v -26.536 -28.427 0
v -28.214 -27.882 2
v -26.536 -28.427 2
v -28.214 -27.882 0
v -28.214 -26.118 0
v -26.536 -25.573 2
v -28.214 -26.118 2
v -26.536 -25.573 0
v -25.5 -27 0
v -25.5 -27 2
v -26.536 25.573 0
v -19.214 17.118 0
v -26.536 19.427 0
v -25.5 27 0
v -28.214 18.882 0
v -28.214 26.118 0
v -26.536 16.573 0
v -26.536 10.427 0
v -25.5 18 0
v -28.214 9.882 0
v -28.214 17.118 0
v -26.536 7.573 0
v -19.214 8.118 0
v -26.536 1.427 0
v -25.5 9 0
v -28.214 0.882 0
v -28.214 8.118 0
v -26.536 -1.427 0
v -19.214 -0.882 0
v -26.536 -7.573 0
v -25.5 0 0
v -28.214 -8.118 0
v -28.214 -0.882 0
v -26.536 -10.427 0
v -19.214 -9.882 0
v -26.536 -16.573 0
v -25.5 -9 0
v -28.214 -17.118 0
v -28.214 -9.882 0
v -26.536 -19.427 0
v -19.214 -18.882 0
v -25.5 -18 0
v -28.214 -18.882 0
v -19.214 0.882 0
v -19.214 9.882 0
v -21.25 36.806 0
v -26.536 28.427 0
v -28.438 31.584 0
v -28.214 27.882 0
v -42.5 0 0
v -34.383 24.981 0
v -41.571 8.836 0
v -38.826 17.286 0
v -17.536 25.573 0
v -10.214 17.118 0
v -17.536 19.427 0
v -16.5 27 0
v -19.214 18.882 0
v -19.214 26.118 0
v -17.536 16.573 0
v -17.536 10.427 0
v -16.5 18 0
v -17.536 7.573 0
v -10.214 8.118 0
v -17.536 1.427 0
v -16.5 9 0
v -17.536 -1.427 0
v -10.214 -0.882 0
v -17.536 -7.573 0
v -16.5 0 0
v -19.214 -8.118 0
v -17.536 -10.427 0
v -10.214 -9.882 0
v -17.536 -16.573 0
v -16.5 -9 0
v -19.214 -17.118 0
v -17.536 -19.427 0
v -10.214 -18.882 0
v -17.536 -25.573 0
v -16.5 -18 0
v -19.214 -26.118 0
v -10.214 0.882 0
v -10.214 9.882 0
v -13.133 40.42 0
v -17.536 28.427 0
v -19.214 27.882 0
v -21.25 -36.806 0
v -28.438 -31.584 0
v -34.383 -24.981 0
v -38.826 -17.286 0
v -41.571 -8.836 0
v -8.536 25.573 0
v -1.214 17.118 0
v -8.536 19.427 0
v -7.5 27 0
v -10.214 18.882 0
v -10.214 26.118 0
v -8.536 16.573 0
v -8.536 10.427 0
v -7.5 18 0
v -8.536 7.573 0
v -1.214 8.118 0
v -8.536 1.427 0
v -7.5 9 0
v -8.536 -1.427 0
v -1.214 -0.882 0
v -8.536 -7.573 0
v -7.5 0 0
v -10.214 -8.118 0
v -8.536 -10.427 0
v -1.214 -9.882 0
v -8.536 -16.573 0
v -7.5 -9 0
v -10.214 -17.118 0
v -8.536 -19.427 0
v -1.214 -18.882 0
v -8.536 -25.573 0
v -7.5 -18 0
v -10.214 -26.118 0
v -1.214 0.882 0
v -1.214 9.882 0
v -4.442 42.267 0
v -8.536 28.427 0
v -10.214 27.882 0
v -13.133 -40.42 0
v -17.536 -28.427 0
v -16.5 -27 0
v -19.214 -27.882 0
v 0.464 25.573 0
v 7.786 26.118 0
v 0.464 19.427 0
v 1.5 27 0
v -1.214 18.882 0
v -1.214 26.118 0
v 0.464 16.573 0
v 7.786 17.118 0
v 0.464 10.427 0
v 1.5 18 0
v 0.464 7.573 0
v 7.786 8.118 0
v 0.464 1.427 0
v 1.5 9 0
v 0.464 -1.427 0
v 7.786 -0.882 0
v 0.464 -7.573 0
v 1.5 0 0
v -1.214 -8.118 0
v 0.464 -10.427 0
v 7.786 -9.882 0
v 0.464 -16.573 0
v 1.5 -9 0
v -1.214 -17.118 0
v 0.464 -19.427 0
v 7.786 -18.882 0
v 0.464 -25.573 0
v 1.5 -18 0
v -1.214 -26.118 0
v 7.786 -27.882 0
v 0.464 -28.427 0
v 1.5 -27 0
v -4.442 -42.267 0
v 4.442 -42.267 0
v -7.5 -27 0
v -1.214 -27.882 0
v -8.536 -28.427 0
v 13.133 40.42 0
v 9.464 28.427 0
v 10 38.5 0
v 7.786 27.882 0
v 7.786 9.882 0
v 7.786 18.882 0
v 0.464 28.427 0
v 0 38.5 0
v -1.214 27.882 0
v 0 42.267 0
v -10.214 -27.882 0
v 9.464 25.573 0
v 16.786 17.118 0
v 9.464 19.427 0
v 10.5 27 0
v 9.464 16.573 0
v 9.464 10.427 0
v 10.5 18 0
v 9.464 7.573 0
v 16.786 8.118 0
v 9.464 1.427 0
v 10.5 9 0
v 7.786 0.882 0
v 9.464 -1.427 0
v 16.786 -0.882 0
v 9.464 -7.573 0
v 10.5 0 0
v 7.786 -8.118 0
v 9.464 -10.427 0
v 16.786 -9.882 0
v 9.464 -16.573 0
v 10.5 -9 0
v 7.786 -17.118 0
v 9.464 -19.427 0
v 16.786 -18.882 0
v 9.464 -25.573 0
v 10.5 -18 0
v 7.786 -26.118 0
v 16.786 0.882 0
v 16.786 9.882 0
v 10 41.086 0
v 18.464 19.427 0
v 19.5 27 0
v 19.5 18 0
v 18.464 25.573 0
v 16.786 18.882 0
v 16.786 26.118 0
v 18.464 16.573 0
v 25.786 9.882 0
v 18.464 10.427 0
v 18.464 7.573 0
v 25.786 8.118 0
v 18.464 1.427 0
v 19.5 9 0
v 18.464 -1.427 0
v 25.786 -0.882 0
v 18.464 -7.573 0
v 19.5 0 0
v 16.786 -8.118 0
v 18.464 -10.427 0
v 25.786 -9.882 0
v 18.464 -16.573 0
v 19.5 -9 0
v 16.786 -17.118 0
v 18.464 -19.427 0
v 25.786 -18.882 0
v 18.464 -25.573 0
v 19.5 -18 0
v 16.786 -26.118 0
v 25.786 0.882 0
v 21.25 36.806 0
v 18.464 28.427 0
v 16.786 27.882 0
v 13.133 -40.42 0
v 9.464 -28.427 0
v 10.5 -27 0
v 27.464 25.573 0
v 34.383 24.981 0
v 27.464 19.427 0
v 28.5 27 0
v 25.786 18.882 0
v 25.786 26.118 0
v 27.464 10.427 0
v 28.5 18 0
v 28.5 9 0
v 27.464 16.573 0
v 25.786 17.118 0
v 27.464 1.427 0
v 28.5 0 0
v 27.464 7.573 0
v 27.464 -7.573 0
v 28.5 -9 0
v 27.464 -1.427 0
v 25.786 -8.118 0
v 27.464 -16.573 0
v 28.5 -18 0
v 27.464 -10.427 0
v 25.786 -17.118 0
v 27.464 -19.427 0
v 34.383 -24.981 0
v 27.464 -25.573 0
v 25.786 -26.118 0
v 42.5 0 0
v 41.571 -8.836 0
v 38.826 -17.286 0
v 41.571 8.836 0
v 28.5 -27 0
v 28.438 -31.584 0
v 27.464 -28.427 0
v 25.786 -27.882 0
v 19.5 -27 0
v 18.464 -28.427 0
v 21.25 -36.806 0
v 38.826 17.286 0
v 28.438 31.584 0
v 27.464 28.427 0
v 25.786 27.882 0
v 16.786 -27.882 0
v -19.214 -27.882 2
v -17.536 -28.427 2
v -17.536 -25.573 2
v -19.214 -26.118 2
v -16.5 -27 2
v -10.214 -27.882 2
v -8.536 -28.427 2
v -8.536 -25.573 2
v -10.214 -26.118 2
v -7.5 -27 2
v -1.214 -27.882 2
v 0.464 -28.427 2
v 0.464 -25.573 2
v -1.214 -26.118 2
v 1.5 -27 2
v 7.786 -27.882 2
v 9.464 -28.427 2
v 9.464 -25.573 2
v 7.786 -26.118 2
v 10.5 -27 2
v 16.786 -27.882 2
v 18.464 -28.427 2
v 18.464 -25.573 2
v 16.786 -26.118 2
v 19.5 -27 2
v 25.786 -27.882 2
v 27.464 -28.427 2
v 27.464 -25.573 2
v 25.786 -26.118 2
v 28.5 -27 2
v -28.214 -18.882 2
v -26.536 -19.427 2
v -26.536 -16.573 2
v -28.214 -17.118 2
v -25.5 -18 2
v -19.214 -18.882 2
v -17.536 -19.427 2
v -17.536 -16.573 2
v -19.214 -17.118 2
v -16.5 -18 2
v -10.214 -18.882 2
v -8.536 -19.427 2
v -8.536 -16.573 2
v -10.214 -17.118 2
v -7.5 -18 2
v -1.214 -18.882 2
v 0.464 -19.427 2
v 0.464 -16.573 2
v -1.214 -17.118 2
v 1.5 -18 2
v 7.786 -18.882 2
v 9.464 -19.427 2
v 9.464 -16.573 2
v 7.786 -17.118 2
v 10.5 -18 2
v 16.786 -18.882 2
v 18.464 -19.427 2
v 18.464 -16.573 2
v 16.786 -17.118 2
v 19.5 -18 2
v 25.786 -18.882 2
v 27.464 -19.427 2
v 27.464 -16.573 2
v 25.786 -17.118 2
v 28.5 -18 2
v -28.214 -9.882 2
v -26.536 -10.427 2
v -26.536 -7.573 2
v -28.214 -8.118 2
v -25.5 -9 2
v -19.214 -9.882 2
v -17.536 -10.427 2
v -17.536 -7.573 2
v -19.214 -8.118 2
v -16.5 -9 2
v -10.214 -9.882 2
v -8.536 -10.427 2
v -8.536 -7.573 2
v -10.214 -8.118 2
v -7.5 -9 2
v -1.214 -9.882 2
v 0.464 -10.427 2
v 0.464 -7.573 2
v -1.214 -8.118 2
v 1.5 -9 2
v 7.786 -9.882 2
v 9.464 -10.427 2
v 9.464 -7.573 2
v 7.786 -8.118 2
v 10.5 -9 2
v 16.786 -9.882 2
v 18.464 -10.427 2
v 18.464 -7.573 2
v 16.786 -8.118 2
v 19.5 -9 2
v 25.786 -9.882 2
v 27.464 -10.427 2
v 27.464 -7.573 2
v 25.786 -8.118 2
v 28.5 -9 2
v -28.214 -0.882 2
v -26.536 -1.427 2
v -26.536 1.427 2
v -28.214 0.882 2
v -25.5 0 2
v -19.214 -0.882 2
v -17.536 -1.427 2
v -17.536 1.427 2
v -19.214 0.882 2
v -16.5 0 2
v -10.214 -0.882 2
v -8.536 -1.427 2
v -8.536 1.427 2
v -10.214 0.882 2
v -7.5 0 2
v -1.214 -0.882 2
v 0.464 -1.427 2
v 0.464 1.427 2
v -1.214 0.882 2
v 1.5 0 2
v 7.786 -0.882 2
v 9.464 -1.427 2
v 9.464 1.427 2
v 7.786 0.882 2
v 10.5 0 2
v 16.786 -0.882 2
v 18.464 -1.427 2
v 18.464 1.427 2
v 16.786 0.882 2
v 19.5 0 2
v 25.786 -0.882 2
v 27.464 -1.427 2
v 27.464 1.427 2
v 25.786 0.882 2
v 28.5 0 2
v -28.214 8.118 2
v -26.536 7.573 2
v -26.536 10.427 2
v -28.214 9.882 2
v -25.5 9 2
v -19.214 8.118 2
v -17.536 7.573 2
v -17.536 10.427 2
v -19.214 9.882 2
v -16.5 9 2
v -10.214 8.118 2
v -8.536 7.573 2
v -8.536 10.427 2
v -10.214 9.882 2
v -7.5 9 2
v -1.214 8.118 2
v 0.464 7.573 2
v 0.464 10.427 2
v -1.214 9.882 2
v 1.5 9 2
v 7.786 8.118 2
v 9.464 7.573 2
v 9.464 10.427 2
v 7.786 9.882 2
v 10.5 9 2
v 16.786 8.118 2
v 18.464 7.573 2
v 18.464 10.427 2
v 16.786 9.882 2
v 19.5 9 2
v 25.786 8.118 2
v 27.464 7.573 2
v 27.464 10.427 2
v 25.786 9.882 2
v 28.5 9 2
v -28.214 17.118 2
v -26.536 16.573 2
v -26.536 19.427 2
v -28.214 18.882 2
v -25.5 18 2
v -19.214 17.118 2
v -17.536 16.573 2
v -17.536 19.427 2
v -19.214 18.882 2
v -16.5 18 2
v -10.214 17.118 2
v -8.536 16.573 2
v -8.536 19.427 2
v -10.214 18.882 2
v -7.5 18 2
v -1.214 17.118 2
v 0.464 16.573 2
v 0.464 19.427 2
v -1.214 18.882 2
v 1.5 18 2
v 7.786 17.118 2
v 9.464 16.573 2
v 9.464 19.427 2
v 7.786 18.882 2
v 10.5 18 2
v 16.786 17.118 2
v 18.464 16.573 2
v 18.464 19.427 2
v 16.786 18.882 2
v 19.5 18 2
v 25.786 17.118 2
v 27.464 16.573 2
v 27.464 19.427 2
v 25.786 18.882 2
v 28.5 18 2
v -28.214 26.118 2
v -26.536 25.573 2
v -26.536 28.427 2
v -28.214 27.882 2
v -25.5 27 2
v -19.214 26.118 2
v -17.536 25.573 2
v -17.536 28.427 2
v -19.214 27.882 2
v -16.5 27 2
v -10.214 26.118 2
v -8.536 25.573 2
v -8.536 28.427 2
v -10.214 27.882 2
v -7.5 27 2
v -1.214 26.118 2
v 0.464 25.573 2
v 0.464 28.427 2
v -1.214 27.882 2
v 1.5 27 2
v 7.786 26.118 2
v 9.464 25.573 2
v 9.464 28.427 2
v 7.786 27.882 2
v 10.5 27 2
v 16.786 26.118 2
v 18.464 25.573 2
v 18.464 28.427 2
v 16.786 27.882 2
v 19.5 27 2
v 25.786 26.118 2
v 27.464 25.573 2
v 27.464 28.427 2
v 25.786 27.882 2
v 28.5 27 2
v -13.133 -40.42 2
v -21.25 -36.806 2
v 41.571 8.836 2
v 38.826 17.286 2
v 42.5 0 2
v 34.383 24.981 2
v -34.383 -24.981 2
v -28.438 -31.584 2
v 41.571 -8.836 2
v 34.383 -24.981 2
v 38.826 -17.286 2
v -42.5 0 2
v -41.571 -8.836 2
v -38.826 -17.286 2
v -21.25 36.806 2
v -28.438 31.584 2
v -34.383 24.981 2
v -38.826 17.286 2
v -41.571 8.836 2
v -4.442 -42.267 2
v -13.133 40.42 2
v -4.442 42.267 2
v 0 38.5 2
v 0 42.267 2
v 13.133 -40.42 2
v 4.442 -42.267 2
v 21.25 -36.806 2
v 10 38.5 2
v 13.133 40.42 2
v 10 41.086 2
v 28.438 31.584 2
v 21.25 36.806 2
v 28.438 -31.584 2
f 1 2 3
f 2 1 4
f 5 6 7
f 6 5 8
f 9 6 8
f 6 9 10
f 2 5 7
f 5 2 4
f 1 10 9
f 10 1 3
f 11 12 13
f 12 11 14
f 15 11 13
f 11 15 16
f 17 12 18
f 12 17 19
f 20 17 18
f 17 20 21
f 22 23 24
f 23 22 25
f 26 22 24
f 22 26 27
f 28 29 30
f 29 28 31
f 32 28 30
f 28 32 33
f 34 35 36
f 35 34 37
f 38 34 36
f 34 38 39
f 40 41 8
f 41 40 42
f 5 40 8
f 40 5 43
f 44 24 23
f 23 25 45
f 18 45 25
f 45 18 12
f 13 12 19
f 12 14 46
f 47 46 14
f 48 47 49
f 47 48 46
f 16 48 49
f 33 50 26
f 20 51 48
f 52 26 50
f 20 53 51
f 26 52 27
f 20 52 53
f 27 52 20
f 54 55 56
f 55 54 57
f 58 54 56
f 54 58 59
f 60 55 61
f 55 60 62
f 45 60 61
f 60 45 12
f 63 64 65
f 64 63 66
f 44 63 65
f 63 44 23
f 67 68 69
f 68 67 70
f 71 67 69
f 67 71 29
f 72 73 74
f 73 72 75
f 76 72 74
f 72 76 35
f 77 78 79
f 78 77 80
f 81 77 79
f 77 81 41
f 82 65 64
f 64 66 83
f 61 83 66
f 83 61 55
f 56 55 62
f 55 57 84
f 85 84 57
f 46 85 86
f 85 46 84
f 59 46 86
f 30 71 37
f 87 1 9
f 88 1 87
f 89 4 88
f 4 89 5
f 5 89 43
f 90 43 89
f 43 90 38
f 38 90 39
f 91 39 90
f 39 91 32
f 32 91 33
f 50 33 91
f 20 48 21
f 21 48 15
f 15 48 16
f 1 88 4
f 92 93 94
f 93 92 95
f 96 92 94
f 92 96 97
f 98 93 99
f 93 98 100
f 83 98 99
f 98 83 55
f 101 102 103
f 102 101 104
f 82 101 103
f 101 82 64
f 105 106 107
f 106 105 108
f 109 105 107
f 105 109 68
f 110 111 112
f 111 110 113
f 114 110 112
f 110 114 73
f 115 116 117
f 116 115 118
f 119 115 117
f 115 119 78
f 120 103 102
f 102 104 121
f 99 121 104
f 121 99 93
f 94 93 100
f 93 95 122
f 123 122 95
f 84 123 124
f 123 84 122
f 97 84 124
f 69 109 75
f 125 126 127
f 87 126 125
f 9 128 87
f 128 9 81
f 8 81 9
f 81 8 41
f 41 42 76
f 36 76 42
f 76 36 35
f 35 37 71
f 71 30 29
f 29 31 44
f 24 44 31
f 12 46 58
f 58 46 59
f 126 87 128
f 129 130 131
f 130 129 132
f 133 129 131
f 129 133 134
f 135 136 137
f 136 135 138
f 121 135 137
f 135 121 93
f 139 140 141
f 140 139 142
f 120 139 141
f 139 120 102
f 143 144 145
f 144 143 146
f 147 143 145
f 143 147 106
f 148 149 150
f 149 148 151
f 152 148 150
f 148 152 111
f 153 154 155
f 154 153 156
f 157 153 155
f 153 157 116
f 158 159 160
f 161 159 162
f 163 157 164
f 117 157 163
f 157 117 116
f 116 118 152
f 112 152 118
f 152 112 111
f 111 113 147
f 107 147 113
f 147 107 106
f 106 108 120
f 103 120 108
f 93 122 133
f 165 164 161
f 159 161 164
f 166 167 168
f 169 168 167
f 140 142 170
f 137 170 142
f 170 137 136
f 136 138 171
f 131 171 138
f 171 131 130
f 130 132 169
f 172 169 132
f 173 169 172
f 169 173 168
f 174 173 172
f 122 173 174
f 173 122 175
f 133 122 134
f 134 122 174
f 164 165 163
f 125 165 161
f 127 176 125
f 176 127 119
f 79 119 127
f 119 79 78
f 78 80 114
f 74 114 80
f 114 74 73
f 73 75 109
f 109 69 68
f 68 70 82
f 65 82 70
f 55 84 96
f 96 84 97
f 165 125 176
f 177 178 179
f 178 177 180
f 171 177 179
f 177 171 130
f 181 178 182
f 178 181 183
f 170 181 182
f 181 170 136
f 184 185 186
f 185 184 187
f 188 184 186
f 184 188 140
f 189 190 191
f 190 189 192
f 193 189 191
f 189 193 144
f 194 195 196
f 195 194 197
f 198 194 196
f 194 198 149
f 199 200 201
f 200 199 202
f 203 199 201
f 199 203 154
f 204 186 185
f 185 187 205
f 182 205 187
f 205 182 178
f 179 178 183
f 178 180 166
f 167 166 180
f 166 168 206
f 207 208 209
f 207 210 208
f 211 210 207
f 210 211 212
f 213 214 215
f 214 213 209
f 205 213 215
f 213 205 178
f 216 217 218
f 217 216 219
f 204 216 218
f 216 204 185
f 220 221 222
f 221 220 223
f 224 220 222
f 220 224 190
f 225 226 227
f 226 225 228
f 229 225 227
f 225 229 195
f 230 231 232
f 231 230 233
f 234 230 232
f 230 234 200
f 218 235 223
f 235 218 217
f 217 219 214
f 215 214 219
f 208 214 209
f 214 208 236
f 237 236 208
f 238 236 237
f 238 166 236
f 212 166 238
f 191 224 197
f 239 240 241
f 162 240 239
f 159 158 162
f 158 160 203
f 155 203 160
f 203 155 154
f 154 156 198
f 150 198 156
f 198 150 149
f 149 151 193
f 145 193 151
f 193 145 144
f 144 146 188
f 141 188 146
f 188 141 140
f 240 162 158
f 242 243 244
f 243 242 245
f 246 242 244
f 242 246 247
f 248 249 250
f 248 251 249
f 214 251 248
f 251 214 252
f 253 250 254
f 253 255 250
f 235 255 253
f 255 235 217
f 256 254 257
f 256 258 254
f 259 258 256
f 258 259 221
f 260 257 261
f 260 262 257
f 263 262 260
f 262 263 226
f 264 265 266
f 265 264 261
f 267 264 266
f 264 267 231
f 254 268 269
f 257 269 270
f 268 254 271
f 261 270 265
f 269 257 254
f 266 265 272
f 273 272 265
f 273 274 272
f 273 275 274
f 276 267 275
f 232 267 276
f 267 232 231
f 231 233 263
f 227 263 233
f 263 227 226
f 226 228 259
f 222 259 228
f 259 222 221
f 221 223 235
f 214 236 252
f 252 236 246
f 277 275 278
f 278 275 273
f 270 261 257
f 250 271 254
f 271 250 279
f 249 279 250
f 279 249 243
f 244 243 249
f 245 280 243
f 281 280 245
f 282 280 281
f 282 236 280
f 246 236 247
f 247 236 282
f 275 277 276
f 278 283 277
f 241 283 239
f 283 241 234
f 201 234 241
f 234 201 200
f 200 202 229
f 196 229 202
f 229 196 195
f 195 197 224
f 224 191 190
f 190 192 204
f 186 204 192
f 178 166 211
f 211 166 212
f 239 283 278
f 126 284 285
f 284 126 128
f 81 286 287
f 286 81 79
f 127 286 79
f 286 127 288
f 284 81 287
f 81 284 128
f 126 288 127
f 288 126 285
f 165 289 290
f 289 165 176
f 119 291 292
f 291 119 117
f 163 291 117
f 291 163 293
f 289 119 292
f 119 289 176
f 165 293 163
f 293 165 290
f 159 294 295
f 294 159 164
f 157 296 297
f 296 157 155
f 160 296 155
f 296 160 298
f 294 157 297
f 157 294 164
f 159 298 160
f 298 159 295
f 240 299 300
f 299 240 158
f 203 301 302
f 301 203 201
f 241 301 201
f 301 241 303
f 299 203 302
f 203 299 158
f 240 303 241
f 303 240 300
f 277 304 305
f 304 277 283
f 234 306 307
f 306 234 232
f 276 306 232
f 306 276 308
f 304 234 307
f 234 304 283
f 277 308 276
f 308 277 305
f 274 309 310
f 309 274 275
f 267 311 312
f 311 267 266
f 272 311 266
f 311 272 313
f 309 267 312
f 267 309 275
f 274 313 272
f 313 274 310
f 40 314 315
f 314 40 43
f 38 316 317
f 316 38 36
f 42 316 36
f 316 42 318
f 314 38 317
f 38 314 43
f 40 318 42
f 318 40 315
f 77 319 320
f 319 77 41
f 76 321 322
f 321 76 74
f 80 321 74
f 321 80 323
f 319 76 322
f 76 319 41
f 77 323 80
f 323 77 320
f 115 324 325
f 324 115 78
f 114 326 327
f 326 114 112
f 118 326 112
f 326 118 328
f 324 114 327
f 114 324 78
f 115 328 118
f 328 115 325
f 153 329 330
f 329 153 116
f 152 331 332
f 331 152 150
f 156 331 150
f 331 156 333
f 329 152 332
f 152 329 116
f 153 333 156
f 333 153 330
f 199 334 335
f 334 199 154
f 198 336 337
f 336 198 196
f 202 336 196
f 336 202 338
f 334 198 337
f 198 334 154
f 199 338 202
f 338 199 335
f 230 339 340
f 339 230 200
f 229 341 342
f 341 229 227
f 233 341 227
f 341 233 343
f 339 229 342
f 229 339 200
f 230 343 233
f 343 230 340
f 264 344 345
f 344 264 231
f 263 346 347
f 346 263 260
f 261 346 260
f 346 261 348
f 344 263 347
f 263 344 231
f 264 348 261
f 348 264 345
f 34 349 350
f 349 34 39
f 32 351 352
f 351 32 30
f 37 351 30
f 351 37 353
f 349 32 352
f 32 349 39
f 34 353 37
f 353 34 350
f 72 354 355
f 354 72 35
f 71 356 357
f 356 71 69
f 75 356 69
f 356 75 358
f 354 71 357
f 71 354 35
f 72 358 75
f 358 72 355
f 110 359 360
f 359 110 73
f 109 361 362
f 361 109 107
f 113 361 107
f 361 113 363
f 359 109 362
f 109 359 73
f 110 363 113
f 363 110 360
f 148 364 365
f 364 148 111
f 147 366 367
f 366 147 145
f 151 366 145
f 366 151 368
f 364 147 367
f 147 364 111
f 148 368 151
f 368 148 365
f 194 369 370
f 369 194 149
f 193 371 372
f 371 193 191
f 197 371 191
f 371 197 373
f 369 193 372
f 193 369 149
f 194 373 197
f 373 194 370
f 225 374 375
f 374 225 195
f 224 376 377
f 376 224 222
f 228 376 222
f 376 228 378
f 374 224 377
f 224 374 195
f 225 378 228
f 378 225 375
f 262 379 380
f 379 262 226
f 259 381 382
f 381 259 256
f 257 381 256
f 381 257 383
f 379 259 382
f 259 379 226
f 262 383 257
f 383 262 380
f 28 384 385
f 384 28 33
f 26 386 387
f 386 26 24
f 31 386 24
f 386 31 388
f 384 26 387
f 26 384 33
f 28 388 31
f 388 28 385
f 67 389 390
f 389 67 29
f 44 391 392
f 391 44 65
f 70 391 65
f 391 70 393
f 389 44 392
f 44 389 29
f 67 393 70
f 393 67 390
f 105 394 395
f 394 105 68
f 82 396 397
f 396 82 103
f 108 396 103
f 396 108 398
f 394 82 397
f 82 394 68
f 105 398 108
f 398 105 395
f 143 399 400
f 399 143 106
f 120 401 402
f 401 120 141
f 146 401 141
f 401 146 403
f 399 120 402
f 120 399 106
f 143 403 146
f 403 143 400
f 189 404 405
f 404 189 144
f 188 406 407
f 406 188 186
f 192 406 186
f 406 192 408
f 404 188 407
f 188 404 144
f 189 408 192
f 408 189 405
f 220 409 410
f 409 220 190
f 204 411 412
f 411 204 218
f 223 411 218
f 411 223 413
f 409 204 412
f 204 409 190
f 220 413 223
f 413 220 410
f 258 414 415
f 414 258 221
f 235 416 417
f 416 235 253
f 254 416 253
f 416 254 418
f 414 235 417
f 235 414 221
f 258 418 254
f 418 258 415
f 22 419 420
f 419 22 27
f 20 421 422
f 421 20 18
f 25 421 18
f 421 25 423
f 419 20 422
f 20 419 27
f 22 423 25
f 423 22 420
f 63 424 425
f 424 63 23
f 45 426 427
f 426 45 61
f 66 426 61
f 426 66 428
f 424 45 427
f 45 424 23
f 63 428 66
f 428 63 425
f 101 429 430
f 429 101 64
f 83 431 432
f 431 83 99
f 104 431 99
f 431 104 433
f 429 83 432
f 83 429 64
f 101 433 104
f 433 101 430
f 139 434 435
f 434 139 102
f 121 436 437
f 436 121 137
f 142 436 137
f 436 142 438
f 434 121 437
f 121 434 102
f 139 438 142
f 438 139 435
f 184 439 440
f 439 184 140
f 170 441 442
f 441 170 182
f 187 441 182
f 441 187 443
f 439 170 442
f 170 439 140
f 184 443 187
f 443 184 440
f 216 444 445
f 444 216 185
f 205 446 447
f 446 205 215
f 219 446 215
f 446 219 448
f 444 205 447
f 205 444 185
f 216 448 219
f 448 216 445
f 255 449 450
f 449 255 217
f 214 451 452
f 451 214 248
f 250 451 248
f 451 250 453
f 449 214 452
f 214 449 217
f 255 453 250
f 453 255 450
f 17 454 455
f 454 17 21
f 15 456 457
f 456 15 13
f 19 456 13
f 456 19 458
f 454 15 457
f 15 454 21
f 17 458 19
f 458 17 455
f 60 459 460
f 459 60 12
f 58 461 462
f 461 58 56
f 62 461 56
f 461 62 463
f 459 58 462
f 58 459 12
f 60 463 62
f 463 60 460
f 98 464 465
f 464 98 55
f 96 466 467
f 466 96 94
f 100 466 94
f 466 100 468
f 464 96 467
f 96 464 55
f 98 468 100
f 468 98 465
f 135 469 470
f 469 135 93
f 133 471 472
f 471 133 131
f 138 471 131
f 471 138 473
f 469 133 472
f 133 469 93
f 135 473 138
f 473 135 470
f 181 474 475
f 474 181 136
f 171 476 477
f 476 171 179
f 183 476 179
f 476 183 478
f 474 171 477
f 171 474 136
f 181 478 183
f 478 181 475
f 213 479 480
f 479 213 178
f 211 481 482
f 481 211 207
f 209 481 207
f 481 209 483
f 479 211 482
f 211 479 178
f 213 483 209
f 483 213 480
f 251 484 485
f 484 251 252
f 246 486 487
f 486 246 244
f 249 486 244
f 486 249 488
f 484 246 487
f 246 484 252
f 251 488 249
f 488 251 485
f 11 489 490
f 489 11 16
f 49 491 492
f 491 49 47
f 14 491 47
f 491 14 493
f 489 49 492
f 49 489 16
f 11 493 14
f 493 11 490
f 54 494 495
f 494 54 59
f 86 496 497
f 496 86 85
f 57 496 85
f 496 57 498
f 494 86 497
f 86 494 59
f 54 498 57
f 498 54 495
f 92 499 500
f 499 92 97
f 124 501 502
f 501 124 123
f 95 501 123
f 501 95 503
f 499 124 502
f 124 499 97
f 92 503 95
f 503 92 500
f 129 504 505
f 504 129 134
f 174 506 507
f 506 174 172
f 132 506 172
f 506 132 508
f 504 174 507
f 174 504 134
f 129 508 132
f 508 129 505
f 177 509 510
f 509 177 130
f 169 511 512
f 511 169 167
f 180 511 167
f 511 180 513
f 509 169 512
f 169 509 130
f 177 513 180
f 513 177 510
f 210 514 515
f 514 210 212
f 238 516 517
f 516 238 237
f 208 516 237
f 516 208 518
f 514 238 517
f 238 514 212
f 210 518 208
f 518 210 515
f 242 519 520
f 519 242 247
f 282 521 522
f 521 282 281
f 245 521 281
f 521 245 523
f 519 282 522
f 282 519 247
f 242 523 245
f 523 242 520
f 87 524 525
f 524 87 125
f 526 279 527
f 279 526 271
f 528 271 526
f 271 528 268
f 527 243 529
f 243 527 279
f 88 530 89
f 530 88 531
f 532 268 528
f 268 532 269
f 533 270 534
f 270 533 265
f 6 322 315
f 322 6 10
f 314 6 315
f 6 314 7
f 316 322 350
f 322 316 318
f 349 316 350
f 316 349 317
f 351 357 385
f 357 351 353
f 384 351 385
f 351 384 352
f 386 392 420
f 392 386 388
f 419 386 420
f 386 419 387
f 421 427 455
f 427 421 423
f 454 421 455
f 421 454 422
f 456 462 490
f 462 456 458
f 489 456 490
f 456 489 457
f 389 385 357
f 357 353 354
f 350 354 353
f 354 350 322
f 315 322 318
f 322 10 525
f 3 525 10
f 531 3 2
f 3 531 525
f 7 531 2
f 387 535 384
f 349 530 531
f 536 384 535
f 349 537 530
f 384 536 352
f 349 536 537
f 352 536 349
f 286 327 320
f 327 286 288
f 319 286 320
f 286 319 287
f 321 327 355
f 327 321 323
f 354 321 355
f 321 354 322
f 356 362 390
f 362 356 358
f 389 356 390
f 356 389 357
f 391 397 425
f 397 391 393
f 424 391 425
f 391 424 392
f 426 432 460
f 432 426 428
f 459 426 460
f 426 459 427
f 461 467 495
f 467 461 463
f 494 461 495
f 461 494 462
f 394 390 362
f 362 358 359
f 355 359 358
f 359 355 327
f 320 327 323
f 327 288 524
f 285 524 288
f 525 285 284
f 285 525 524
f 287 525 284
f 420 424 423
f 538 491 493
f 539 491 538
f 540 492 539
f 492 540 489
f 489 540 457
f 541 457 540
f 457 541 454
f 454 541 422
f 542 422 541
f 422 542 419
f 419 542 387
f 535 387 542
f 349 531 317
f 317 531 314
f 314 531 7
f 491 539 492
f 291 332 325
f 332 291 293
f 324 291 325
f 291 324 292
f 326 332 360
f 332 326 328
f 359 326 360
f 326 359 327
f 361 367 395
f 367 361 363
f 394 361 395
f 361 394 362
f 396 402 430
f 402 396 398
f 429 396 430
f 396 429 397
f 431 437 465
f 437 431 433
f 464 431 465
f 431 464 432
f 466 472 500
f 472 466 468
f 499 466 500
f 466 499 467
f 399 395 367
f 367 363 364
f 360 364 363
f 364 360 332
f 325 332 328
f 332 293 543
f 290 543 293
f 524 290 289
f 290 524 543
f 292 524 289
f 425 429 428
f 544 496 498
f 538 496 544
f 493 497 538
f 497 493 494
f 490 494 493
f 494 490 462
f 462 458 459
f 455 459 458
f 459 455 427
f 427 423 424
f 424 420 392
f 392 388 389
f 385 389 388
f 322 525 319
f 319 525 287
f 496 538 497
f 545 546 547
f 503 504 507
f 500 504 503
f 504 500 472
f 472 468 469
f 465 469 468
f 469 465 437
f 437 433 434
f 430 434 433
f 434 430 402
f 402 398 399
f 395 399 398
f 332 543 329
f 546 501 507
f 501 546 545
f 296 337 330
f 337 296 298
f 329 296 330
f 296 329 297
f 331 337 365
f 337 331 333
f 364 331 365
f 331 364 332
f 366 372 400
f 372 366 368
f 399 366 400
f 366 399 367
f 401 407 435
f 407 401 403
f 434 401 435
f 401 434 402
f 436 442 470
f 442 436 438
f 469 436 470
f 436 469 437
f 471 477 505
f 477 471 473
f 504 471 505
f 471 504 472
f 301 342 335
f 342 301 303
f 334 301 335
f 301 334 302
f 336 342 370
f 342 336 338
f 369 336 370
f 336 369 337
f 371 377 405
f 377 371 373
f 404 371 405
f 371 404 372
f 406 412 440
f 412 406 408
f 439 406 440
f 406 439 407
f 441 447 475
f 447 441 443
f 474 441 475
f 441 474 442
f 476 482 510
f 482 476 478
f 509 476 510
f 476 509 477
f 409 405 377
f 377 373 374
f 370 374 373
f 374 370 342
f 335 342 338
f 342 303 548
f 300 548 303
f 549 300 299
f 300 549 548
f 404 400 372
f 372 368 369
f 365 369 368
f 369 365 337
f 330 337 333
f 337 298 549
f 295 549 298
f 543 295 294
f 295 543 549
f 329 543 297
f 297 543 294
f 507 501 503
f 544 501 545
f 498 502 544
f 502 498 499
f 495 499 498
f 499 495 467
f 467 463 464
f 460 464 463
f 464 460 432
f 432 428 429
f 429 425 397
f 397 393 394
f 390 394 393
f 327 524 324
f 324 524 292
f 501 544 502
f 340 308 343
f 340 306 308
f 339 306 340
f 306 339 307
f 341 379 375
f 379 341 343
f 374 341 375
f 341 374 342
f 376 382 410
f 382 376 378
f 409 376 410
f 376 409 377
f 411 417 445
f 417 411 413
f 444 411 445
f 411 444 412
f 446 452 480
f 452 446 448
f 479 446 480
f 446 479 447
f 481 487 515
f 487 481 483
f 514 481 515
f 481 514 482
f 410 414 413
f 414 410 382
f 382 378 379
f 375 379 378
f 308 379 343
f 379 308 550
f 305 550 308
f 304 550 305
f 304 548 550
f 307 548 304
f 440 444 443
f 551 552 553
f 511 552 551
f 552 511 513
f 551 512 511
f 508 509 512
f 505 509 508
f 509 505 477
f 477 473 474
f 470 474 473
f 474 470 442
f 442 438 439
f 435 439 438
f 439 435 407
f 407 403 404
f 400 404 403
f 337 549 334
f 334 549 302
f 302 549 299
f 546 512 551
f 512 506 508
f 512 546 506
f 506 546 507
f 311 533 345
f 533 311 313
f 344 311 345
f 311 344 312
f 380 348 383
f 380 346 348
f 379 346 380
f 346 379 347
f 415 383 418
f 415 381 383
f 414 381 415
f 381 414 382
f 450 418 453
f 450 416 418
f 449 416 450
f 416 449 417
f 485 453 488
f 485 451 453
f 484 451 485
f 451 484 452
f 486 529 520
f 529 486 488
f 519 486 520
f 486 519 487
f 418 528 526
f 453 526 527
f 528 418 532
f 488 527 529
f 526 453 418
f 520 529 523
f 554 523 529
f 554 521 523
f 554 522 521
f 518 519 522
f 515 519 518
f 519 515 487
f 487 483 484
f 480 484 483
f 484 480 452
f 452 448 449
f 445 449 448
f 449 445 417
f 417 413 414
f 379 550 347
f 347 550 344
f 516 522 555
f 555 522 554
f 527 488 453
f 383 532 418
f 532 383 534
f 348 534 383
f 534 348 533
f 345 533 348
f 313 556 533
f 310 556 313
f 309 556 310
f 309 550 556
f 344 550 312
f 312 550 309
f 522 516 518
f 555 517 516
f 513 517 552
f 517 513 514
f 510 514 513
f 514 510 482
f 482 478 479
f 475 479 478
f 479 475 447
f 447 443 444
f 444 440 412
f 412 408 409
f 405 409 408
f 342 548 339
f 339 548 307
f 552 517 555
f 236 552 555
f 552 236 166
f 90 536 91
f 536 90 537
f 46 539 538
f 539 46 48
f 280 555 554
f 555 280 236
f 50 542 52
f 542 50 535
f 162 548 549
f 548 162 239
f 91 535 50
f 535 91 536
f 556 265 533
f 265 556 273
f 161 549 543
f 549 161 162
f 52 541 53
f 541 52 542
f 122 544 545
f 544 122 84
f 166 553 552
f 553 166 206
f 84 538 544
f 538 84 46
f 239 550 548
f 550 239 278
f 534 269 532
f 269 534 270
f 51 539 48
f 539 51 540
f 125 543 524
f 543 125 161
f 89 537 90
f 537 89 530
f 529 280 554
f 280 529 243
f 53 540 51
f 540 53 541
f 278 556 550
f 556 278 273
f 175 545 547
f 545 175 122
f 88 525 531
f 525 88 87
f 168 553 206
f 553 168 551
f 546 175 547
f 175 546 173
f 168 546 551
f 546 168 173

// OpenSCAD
// Sowing Template for 90mm Petri Dish
// Designed to sit flat on the XY plane (Z=0)

// --- Dimensions ---
// Disc outer diameter
D_OUTER = 85;
// Disc thickness
T_THICK = 2;
// Grid configuration
GRID_ROWS = 7;
GRID_COLS = 7;
// Hole diameter
D_HOLE = 3;
// Hole spacing (center-to-center)
S_SPACING = 9;
// Notch dimensions
N_WIDTH = 10;   // Width in X
N_DEPTH = 4;    // Depth in Y (from rim)
// Orientation notch location: +Y side, centered on Y axis

// --- Derived Dimensions ---
// Radius of the disc
R_OUTER = D_OUTER / 2;
// Radius of the hole
R_HOLE = D_HOLE / 2;
// Radius of the notch cut (half width)
R_NOTCH_X = N_WIDTH / 2;
// Y position of the notch start (Rim radius - Notch depth)
Y_NOTCH_START = R_OUTER - N_DEPTH;

// --- Main Body ---
// Create the flat disc
difference() {
    // Main disc cylinder
    // Note: center=false ensures the bottom face is at Z=0
    cylinder(
        h = T_THICK,
        r = R_OUTER,
        center = false
    );
    
    // --- Cut Holes ---
    // Loop to create the 7x7 grid of holes
    for (y = [-(GRID_ROWS-1)/2 : 1 : (GRID_ROWS-1)/2]) {
        for (x = [-(GRID_COLS-1)/2 : 1 : (GRID_COLS-1)/2]) {
            translate([x * S_SPACING, y * S_SPACING, 0]) {
                // Extend slightly past the face to ensure clean cut
                cylinder(
                    h = T_THICK + 0.1, 
                    r = R_HOLE,
                    center = false
                );
            }
        }
    }
    
    // --- Cut Orientation Notch ---
    // The notch is on the +Y side, centered on the Y axis.
    // It cuts into the rim.
    // We define a rectangular prism that intersects the cylinder.
    // The notch is 10mm wide (X) and 4mm deep (Y).
    // Position: Centered at X=0. Starts at Y = R_OUTER - N_DEPTH.
    translate([0, Y_NOTCH_START, 0]) {
        // The cut shape needs to extend slightly past the Z=0 and Z=T_THICK faces
        // to ensure the cut goes all the way through.
        cube([
            N_WIDTH,      // X size
            N_DEPTH,      // Y size
            T_THICK + 0.1 // Z size (extends slightly past top and bottom)
        ]);
    }
}
